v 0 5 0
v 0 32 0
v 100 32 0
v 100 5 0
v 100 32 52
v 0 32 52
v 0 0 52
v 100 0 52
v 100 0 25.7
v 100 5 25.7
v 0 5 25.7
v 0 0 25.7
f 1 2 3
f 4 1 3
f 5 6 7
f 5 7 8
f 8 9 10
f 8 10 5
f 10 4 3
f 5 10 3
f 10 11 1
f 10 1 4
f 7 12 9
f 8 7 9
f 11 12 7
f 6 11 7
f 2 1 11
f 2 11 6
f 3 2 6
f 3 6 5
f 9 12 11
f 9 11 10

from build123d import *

# Parameters (mm, degrees)
BOX_W        = 100
BOX_H        = 32
BOX_DEPTH    = 52
SKETCH_W     = 100
SKETCH_H     = 25.7
POCKET_DEPTH = 5


with BuildPart() as part:
    # Box → Box (new body)
    with BuildSketch(Plane.XY):
        with Locations((50, 16)):
            Rectangle(BOX_W, BOX_H)
    extrude(amount=BOX_DEPTH)

    # Sketch → Pocket (cut)
    with BuildSketch(Plane.XZ):
        with Locations((50, 12.85)):
            Rectangle(SKETCH_W, SKETCH_H)
    extrude(amount=-POCKET_DEPTH, mode=Mode.SUBTRACT)


solid = part.part
